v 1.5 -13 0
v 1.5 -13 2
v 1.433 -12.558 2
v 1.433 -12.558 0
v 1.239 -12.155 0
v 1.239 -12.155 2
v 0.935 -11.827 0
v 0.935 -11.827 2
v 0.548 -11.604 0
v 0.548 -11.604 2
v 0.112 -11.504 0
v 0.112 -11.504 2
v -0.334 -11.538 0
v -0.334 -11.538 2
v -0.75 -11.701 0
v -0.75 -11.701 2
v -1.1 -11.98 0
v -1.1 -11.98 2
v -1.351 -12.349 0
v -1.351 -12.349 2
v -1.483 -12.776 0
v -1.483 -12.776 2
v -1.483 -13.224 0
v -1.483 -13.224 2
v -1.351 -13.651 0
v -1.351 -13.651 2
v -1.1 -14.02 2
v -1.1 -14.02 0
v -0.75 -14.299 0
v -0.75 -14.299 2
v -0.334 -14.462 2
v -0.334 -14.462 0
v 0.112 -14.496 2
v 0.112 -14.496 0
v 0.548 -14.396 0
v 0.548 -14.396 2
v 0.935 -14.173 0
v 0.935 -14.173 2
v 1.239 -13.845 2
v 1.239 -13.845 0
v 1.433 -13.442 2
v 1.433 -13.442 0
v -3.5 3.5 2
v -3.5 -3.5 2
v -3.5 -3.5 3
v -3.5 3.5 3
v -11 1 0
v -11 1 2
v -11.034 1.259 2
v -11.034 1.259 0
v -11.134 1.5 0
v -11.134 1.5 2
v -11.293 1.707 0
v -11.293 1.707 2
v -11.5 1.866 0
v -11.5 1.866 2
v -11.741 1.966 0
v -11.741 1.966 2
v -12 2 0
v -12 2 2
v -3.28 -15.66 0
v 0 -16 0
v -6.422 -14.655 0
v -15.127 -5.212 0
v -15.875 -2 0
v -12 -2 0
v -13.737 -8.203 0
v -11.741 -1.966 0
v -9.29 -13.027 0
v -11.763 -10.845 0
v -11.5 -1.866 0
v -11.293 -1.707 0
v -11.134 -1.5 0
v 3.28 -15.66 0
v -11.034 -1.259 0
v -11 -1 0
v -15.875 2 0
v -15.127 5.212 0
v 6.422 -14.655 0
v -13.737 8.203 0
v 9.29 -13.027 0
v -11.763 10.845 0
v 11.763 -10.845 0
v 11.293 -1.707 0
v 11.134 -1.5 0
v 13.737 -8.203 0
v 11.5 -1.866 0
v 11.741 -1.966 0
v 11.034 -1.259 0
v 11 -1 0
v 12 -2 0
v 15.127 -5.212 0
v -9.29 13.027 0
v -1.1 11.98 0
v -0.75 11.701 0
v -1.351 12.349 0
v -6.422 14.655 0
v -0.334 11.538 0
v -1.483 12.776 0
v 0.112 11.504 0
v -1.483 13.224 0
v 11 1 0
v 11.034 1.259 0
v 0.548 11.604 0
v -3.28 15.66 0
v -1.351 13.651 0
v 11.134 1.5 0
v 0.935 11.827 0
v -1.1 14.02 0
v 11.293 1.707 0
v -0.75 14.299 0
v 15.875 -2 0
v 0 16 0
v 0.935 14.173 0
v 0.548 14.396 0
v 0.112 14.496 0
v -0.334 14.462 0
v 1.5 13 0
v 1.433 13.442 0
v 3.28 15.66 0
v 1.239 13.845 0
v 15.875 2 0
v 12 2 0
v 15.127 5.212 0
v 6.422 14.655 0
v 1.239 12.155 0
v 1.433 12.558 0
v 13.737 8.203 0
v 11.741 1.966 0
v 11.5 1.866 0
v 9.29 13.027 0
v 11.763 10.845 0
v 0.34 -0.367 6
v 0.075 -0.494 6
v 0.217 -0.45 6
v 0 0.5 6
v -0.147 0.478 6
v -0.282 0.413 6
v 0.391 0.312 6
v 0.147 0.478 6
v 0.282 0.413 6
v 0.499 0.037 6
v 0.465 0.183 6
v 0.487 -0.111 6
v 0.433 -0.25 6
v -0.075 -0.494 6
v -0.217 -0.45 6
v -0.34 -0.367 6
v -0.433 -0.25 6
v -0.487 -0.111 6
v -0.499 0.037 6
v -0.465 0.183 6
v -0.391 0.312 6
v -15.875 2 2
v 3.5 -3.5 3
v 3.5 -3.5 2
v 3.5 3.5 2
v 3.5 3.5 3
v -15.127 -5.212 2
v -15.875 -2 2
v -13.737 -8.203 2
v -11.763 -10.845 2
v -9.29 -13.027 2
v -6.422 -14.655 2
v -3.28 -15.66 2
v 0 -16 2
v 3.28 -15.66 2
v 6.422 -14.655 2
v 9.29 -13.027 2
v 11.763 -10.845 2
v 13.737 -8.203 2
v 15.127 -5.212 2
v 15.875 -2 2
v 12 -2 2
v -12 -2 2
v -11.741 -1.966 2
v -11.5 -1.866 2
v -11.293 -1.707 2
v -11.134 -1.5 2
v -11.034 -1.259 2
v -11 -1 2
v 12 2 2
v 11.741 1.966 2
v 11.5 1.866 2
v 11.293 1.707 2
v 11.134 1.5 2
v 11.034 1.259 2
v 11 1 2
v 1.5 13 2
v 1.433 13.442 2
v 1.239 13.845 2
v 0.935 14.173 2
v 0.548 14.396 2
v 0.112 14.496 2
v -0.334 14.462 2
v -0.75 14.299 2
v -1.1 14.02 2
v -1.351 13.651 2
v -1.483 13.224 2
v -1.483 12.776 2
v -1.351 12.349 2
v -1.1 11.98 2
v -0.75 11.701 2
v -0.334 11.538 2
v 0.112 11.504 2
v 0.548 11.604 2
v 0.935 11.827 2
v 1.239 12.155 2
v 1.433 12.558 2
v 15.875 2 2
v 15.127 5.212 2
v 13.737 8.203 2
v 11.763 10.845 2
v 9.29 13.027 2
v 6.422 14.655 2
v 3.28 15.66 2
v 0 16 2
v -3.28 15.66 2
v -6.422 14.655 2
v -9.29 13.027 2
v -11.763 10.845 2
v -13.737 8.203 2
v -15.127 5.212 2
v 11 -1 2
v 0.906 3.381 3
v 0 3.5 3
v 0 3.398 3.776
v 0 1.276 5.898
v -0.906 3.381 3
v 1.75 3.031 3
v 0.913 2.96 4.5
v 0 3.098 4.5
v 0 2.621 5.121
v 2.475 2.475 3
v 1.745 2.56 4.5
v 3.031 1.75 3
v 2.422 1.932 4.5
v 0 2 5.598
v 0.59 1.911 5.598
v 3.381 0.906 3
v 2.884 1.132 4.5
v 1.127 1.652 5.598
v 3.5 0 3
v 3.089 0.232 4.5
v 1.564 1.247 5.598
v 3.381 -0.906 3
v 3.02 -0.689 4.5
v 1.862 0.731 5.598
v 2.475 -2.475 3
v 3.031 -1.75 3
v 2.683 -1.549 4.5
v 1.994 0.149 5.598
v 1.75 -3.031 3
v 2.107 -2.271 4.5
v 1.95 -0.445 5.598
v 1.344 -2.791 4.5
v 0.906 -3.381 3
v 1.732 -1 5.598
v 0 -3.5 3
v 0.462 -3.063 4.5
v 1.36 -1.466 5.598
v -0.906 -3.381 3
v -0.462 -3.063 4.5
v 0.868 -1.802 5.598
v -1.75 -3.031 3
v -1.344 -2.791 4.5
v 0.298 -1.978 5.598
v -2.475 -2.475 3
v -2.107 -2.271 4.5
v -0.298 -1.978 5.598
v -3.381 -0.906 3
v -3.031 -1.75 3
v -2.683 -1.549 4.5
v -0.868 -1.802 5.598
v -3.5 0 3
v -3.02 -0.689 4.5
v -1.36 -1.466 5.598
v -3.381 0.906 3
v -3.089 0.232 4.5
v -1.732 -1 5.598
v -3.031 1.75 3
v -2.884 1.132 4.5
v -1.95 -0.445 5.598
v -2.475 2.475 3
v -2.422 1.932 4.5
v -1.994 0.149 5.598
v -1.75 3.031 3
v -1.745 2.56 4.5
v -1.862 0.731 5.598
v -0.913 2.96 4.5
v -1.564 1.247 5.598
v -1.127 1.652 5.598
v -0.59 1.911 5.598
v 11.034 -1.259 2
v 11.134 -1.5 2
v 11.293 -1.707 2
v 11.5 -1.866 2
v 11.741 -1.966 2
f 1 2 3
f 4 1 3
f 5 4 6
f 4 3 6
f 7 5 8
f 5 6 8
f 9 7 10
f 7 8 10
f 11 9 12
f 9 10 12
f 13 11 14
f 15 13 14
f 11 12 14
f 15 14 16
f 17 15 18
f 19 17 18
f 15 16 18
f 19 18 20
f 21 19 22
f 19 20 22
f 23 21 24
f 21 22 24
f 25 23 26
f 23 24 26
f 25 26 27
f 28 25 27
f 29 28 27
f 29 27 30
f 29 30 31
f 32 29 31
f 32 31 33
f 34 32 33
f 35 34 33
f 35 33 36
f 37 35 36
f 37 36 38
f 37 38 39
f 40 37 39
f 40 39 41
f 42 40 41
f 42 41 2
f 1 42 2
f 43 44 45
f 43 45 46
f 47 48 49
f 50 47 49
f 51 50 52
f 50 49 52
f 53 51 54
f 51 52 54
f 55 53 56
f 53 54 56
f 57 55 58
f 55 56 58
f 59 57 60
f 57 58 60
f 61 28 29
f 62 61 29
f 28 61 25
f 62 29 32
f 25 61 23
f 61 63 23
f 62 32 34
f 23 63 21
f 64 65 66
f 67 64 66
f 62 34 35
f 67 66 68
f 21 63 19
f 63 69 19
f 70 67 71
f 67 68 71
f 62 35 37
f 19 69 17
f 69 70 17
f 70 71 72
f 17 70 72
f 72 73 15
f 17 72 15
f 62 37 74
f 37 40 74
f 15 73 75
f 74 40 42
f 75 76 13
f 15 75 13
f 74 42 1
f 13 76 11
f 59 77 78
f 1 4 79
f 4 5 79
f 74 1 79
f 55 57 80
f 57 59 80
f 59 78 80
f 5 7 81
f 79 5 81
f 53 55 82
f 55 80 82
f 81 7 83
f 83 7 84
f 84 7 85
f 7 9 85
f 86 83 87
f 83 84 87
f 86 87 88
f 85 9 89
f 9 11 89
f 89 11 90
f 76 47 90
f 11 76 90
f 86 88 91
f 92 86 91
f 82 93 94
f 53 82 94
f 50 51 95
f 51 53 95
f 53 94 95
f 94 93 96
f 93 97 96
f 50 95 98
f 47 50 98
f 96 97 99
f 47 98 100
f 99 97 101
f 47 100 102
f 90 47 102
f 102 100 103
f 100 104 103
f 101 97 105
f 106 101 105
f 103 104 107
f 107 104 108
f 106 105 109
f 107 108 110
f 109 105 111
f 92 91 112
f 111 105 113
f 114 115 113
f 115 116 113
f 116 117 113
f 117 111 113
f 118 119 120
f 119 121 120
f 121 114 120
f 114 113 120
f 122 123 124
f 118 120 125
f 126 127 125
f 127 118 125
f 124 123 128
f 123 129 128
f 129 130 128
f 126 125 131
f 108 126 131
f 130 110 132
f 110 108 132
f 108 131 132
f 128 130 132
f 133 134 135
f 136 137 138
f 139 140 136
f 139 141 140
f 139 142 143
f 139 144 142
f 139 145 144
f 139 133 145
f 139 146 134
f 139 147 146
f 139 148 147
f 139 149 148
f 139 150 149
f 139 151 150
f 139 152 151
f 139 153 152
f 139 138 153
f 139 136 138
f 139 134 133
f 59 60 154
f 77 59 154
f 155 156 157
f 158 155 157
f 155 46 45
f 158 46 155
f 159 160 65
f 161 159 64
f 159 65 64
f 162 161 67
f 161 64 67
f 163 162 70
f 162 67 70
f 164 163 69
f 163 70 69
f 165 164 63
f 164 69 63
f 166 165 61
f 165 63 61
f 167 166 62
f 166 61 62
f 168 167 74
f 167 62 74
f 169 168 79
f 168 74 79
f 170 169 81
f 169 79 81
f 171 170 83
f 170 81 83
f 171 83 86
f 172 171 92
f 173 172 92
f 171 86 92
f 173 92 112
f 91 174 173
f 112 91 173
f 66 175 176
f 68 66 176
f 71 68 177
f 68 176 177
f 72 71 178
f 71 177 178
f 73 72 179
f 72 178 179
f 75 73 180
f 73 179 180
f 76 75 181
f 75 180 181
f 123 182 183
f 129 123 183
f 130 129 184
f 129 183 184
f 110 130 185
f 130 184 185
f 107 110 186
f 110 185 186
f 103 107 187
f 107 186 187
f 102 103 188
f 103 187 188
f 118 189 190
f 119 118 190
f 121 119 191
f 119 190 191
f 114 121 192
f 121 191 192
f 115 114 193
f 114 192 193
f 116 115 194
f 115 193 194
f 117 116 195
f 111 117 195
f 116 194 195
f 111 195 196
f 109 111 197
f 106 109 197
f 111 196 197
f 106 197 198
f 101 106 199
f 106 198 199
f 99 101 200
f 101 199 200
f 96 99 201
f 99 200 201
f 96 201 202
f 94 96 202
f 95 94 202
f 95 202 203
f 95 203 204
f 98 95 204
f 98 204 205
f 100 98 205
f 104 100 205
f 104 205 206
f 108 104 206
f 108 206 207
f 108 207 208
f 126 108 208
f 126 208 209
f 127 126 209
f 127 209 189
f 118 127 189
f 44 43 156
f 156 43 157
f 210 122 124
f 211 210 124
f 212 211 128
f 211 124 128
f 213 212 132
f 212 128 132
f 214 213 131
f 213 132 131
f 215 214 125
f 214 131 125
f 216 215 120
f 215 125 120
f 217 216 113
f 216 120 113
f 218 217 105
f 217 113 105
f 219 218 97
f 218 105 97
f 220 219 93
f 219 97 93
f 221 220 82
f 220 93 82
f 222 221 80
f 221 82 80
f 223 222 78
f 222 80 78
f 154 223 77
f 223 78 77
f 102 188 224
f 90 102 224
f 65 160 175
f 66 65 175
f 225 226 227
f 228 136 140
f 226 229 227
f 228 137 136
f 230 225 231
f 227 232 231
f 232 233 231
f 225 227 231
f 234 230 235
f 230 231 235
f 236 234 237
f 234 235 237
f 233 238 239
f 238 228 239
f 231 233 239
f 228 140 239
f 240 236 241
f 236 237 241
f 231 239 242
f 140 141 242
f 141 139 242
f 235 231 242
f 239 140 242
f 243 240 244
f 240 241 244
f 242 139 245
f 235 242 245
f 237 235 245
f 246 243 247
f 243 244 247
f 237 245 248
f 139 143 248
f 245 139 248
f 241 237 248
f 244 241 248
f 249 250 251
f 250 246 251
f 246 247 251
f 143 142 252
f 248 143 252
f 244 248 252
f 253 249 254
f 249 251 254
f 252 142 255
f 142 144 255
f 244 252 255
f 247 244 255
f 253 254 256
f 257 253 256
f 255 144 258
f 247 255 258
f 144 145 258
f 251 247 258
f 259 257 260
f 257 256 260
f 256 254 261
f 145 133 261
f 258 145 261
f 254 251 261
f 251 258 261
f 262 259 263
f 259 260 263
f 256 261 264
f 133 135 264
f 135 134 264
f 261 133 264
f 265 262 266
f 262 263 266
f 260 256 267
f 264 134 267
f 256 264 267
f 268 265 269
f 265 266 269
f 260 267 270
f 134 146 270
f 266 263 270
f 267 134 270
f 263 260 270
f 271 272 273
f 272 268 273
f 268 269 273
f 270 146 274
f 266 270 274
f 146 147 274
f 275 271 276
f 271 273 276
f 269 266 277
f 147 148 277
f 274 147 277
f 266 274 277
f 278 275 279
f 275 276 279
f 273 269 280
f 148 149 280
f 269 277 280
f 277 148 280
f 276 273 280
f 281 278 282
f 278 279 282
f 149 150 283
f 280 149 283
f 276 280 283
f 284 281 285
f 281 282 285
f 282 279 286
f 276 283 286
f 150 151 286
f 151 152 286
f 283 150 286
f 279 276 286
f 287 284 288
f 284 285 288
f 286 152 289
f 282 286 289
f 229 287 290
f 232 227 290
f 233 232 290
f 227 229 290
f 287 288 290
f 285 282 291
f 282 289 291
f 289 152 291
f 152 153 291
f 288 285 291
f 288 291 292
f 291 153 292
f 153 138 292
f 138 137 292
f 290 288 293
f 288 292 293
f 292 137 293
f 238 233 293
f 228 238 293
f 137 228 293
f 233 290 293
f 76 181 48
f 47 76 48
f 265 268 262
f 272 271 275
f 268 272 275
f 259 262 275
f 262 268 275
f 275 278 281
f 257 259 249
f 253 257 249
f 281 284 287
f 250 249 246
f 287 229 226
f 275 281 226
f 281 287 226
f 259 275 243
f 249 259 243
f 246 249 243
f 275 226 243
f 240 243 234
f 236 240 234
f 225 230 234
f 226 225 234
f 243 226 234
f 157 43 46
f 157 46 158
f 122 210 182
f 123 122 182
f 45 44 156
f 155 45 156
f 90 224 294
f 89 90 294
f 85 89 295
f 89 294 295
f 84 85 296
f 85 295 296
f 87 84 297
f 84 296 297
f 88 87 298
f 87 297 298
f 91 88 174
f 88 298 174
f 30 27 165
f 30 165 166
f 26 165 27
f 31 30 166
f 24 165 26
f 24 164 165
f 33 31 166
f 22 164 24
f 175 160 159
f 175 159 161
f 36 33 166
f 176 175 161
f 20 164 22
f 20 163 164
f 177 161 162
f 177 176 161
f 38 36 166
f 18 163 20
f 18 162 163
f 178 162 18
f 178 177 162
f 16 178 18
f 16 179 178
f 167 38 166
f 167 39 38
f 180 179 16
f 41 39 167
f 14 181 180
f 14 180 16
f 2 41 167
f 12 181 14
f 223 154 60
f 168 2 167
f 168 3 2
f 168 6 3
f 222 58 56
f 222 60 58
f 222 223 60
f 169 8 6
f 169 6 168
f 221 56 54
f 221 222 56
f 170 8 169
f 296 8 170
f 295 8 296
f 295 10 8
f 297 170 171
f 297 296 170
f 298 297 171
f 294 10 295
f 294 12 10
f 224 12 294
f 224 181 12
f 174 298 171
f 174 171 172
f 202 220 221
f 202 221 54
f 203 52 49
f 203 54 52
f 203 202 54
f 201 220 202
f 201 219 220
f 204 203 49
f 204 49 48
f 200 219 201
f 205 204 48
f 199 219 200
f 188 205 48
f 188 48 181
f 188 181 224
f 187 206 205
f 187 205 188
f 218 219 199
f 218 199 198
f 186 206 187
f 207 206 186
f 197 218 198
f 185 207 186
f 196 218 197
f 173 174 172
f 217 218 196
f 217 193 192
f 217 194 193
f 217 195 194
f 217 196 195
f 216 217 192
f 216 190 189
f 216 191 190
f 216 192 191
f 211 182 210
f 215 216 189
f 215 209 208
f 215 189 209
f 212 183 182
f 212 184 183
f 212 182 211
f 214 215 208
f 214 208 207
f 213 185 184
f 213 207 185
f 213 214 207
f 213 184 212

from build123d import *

# Parameters (mm, degrees)
F0_R     = 16
F1_DEPTH = 2
F2_R     = 1.5
F3_DEPTH = 2.001
F4_W     = 7
F4_H     = 7
F5_DEPTH = 1
F7_DEPTH = 3


# Not quite as in the source:
# - a fillet or chamfer that OpenCascade refuses, or shapes differently, is made with other operations: its cross-section is extruded or revolved along the edge and cut away or added


with BuildPart() as f1:
    # F0 (on Top) → F1 (new body)
    with BuildSketch(Plane.XY):
        Circle(F0_R)
    extrude(amount=F1_DEPTH)

    # F2 (on face) → F3 (cut, through all)
    with BuildSketch(Plane.XY.offset(2)):
        with BuildLine():
            ThreePointArc((-11, 1), (-11.2928932188, 1.7071067812), (-12, 2))
            Line((-12, 2), (-15.8745078664, 2))
            ThreePointArc((-15.8745078664, 2), (-16, 0), (-15.8745078664, -2))
            Line((-15.8745078664, -2), (-12, -2))
            ThreePointArc((-12, -2), (-11.2928932188, -1.7071067812), (-11, -1))
            Line((-11, -1), (-11, 1))
        make_face()
        with BuildLine():
            ThreePointArc((-15.8745078664, -2), (-16, 0), (-15.8745078664, 2))
            Line((-15.8745078664, 2), (-21, 2))
            Line((-21, 2), (-21, -2))
            Line((-21, -2), (-15.8745078664, -2))
        make_face()
        with BuildLine():
            ThreePointArc((16, 0), (15.9685961478, 1.0019666007), (15.8745078664, 2))
            Line((15.8745078664, 2), (12, 2))
            ThreePointArc((12, 2), (11.2928932188, 1.7071067812), (11, 1))
            Line((11, 1), (11, -1))
            ThreePointArc((11, -1), (11.2928932188, -1.7071067812), (12, -2))
            Line((12, -2), (15.8745078664, -2))
            ThreePointArc((15.8745078664, -2), (15.9685961478, -1.0019666007), (16, 0))
        make_face()
        with BuildLine():
            Line((21, 2), (15.8745078664, 2))
            ThreePointArc((15.8745078664, 2), (15.9685961478, 1.0019666007), (16, 0))
            ThreePointArc((16, 0), (15.9685961478, -1.0019666007), (15.8745078664, -2))
            Line((15.8745078664, -2), (21, -2))
            Line((21, -2), (21, 2))
        make_face()
        with Locations((0, 13)):
            Circle(F2_R)
        with Locations((0, -13)):
            Circle(F2_R)
    extrude(amount=-F3_DEPTH, mode=Mode.SUBTRACT)


with BuildPart() as f5:
    # F4 (on face) → F5 (new body)
    with BuildSketch(Plane.XY.offset(2)):
        Rectangle(F4_W, F4_H)
    extrude(amount=F5_DEPTH)


with BuildPart() as f7:
    # F6 (on face) → F7 (new body)
    with BuildSketch(Plane.XY.offset(3)):
        with BuildLine():
            ThreePointArc((0, -3.5), (2.4748737342, -2.4748737342), (3.5, 0))
            ThreePointArc((3.5, 0), (2.4748737342, 2.4748737342), (0, 3.5))
            ThreePointArc((0, 3.5), (-2.4748737342, 2.4748737342), (-3.5, 0))
            ThreePointArc((-3.5, 0), (-2.4748737342, -2.4748737342), (0, -3.5))
        make_face()
    extrude(amount=F7_DEPTH)

    # F8: fillet of radius 3 on 1 edges, made by hand

    # F8_s1 → F8_t2 (revolve, cut)
    with BuildSketch(Plane.YZ):
        with BuildLine():
            ThreePointArc((3.5, 3), (2.6213203436, 5.1213203436), (0.5, 6))
            Line((0.5, 6), (3.5, 6))
            Line((3.5, 6), (3.5, 3))
        make_face()
    revolve(axis=Axis((0, 0, 6), (0, 0, -1)), mode=Mode.SUBTRACT)


solid = Compound([f1.part, f5.part, f7.part])
